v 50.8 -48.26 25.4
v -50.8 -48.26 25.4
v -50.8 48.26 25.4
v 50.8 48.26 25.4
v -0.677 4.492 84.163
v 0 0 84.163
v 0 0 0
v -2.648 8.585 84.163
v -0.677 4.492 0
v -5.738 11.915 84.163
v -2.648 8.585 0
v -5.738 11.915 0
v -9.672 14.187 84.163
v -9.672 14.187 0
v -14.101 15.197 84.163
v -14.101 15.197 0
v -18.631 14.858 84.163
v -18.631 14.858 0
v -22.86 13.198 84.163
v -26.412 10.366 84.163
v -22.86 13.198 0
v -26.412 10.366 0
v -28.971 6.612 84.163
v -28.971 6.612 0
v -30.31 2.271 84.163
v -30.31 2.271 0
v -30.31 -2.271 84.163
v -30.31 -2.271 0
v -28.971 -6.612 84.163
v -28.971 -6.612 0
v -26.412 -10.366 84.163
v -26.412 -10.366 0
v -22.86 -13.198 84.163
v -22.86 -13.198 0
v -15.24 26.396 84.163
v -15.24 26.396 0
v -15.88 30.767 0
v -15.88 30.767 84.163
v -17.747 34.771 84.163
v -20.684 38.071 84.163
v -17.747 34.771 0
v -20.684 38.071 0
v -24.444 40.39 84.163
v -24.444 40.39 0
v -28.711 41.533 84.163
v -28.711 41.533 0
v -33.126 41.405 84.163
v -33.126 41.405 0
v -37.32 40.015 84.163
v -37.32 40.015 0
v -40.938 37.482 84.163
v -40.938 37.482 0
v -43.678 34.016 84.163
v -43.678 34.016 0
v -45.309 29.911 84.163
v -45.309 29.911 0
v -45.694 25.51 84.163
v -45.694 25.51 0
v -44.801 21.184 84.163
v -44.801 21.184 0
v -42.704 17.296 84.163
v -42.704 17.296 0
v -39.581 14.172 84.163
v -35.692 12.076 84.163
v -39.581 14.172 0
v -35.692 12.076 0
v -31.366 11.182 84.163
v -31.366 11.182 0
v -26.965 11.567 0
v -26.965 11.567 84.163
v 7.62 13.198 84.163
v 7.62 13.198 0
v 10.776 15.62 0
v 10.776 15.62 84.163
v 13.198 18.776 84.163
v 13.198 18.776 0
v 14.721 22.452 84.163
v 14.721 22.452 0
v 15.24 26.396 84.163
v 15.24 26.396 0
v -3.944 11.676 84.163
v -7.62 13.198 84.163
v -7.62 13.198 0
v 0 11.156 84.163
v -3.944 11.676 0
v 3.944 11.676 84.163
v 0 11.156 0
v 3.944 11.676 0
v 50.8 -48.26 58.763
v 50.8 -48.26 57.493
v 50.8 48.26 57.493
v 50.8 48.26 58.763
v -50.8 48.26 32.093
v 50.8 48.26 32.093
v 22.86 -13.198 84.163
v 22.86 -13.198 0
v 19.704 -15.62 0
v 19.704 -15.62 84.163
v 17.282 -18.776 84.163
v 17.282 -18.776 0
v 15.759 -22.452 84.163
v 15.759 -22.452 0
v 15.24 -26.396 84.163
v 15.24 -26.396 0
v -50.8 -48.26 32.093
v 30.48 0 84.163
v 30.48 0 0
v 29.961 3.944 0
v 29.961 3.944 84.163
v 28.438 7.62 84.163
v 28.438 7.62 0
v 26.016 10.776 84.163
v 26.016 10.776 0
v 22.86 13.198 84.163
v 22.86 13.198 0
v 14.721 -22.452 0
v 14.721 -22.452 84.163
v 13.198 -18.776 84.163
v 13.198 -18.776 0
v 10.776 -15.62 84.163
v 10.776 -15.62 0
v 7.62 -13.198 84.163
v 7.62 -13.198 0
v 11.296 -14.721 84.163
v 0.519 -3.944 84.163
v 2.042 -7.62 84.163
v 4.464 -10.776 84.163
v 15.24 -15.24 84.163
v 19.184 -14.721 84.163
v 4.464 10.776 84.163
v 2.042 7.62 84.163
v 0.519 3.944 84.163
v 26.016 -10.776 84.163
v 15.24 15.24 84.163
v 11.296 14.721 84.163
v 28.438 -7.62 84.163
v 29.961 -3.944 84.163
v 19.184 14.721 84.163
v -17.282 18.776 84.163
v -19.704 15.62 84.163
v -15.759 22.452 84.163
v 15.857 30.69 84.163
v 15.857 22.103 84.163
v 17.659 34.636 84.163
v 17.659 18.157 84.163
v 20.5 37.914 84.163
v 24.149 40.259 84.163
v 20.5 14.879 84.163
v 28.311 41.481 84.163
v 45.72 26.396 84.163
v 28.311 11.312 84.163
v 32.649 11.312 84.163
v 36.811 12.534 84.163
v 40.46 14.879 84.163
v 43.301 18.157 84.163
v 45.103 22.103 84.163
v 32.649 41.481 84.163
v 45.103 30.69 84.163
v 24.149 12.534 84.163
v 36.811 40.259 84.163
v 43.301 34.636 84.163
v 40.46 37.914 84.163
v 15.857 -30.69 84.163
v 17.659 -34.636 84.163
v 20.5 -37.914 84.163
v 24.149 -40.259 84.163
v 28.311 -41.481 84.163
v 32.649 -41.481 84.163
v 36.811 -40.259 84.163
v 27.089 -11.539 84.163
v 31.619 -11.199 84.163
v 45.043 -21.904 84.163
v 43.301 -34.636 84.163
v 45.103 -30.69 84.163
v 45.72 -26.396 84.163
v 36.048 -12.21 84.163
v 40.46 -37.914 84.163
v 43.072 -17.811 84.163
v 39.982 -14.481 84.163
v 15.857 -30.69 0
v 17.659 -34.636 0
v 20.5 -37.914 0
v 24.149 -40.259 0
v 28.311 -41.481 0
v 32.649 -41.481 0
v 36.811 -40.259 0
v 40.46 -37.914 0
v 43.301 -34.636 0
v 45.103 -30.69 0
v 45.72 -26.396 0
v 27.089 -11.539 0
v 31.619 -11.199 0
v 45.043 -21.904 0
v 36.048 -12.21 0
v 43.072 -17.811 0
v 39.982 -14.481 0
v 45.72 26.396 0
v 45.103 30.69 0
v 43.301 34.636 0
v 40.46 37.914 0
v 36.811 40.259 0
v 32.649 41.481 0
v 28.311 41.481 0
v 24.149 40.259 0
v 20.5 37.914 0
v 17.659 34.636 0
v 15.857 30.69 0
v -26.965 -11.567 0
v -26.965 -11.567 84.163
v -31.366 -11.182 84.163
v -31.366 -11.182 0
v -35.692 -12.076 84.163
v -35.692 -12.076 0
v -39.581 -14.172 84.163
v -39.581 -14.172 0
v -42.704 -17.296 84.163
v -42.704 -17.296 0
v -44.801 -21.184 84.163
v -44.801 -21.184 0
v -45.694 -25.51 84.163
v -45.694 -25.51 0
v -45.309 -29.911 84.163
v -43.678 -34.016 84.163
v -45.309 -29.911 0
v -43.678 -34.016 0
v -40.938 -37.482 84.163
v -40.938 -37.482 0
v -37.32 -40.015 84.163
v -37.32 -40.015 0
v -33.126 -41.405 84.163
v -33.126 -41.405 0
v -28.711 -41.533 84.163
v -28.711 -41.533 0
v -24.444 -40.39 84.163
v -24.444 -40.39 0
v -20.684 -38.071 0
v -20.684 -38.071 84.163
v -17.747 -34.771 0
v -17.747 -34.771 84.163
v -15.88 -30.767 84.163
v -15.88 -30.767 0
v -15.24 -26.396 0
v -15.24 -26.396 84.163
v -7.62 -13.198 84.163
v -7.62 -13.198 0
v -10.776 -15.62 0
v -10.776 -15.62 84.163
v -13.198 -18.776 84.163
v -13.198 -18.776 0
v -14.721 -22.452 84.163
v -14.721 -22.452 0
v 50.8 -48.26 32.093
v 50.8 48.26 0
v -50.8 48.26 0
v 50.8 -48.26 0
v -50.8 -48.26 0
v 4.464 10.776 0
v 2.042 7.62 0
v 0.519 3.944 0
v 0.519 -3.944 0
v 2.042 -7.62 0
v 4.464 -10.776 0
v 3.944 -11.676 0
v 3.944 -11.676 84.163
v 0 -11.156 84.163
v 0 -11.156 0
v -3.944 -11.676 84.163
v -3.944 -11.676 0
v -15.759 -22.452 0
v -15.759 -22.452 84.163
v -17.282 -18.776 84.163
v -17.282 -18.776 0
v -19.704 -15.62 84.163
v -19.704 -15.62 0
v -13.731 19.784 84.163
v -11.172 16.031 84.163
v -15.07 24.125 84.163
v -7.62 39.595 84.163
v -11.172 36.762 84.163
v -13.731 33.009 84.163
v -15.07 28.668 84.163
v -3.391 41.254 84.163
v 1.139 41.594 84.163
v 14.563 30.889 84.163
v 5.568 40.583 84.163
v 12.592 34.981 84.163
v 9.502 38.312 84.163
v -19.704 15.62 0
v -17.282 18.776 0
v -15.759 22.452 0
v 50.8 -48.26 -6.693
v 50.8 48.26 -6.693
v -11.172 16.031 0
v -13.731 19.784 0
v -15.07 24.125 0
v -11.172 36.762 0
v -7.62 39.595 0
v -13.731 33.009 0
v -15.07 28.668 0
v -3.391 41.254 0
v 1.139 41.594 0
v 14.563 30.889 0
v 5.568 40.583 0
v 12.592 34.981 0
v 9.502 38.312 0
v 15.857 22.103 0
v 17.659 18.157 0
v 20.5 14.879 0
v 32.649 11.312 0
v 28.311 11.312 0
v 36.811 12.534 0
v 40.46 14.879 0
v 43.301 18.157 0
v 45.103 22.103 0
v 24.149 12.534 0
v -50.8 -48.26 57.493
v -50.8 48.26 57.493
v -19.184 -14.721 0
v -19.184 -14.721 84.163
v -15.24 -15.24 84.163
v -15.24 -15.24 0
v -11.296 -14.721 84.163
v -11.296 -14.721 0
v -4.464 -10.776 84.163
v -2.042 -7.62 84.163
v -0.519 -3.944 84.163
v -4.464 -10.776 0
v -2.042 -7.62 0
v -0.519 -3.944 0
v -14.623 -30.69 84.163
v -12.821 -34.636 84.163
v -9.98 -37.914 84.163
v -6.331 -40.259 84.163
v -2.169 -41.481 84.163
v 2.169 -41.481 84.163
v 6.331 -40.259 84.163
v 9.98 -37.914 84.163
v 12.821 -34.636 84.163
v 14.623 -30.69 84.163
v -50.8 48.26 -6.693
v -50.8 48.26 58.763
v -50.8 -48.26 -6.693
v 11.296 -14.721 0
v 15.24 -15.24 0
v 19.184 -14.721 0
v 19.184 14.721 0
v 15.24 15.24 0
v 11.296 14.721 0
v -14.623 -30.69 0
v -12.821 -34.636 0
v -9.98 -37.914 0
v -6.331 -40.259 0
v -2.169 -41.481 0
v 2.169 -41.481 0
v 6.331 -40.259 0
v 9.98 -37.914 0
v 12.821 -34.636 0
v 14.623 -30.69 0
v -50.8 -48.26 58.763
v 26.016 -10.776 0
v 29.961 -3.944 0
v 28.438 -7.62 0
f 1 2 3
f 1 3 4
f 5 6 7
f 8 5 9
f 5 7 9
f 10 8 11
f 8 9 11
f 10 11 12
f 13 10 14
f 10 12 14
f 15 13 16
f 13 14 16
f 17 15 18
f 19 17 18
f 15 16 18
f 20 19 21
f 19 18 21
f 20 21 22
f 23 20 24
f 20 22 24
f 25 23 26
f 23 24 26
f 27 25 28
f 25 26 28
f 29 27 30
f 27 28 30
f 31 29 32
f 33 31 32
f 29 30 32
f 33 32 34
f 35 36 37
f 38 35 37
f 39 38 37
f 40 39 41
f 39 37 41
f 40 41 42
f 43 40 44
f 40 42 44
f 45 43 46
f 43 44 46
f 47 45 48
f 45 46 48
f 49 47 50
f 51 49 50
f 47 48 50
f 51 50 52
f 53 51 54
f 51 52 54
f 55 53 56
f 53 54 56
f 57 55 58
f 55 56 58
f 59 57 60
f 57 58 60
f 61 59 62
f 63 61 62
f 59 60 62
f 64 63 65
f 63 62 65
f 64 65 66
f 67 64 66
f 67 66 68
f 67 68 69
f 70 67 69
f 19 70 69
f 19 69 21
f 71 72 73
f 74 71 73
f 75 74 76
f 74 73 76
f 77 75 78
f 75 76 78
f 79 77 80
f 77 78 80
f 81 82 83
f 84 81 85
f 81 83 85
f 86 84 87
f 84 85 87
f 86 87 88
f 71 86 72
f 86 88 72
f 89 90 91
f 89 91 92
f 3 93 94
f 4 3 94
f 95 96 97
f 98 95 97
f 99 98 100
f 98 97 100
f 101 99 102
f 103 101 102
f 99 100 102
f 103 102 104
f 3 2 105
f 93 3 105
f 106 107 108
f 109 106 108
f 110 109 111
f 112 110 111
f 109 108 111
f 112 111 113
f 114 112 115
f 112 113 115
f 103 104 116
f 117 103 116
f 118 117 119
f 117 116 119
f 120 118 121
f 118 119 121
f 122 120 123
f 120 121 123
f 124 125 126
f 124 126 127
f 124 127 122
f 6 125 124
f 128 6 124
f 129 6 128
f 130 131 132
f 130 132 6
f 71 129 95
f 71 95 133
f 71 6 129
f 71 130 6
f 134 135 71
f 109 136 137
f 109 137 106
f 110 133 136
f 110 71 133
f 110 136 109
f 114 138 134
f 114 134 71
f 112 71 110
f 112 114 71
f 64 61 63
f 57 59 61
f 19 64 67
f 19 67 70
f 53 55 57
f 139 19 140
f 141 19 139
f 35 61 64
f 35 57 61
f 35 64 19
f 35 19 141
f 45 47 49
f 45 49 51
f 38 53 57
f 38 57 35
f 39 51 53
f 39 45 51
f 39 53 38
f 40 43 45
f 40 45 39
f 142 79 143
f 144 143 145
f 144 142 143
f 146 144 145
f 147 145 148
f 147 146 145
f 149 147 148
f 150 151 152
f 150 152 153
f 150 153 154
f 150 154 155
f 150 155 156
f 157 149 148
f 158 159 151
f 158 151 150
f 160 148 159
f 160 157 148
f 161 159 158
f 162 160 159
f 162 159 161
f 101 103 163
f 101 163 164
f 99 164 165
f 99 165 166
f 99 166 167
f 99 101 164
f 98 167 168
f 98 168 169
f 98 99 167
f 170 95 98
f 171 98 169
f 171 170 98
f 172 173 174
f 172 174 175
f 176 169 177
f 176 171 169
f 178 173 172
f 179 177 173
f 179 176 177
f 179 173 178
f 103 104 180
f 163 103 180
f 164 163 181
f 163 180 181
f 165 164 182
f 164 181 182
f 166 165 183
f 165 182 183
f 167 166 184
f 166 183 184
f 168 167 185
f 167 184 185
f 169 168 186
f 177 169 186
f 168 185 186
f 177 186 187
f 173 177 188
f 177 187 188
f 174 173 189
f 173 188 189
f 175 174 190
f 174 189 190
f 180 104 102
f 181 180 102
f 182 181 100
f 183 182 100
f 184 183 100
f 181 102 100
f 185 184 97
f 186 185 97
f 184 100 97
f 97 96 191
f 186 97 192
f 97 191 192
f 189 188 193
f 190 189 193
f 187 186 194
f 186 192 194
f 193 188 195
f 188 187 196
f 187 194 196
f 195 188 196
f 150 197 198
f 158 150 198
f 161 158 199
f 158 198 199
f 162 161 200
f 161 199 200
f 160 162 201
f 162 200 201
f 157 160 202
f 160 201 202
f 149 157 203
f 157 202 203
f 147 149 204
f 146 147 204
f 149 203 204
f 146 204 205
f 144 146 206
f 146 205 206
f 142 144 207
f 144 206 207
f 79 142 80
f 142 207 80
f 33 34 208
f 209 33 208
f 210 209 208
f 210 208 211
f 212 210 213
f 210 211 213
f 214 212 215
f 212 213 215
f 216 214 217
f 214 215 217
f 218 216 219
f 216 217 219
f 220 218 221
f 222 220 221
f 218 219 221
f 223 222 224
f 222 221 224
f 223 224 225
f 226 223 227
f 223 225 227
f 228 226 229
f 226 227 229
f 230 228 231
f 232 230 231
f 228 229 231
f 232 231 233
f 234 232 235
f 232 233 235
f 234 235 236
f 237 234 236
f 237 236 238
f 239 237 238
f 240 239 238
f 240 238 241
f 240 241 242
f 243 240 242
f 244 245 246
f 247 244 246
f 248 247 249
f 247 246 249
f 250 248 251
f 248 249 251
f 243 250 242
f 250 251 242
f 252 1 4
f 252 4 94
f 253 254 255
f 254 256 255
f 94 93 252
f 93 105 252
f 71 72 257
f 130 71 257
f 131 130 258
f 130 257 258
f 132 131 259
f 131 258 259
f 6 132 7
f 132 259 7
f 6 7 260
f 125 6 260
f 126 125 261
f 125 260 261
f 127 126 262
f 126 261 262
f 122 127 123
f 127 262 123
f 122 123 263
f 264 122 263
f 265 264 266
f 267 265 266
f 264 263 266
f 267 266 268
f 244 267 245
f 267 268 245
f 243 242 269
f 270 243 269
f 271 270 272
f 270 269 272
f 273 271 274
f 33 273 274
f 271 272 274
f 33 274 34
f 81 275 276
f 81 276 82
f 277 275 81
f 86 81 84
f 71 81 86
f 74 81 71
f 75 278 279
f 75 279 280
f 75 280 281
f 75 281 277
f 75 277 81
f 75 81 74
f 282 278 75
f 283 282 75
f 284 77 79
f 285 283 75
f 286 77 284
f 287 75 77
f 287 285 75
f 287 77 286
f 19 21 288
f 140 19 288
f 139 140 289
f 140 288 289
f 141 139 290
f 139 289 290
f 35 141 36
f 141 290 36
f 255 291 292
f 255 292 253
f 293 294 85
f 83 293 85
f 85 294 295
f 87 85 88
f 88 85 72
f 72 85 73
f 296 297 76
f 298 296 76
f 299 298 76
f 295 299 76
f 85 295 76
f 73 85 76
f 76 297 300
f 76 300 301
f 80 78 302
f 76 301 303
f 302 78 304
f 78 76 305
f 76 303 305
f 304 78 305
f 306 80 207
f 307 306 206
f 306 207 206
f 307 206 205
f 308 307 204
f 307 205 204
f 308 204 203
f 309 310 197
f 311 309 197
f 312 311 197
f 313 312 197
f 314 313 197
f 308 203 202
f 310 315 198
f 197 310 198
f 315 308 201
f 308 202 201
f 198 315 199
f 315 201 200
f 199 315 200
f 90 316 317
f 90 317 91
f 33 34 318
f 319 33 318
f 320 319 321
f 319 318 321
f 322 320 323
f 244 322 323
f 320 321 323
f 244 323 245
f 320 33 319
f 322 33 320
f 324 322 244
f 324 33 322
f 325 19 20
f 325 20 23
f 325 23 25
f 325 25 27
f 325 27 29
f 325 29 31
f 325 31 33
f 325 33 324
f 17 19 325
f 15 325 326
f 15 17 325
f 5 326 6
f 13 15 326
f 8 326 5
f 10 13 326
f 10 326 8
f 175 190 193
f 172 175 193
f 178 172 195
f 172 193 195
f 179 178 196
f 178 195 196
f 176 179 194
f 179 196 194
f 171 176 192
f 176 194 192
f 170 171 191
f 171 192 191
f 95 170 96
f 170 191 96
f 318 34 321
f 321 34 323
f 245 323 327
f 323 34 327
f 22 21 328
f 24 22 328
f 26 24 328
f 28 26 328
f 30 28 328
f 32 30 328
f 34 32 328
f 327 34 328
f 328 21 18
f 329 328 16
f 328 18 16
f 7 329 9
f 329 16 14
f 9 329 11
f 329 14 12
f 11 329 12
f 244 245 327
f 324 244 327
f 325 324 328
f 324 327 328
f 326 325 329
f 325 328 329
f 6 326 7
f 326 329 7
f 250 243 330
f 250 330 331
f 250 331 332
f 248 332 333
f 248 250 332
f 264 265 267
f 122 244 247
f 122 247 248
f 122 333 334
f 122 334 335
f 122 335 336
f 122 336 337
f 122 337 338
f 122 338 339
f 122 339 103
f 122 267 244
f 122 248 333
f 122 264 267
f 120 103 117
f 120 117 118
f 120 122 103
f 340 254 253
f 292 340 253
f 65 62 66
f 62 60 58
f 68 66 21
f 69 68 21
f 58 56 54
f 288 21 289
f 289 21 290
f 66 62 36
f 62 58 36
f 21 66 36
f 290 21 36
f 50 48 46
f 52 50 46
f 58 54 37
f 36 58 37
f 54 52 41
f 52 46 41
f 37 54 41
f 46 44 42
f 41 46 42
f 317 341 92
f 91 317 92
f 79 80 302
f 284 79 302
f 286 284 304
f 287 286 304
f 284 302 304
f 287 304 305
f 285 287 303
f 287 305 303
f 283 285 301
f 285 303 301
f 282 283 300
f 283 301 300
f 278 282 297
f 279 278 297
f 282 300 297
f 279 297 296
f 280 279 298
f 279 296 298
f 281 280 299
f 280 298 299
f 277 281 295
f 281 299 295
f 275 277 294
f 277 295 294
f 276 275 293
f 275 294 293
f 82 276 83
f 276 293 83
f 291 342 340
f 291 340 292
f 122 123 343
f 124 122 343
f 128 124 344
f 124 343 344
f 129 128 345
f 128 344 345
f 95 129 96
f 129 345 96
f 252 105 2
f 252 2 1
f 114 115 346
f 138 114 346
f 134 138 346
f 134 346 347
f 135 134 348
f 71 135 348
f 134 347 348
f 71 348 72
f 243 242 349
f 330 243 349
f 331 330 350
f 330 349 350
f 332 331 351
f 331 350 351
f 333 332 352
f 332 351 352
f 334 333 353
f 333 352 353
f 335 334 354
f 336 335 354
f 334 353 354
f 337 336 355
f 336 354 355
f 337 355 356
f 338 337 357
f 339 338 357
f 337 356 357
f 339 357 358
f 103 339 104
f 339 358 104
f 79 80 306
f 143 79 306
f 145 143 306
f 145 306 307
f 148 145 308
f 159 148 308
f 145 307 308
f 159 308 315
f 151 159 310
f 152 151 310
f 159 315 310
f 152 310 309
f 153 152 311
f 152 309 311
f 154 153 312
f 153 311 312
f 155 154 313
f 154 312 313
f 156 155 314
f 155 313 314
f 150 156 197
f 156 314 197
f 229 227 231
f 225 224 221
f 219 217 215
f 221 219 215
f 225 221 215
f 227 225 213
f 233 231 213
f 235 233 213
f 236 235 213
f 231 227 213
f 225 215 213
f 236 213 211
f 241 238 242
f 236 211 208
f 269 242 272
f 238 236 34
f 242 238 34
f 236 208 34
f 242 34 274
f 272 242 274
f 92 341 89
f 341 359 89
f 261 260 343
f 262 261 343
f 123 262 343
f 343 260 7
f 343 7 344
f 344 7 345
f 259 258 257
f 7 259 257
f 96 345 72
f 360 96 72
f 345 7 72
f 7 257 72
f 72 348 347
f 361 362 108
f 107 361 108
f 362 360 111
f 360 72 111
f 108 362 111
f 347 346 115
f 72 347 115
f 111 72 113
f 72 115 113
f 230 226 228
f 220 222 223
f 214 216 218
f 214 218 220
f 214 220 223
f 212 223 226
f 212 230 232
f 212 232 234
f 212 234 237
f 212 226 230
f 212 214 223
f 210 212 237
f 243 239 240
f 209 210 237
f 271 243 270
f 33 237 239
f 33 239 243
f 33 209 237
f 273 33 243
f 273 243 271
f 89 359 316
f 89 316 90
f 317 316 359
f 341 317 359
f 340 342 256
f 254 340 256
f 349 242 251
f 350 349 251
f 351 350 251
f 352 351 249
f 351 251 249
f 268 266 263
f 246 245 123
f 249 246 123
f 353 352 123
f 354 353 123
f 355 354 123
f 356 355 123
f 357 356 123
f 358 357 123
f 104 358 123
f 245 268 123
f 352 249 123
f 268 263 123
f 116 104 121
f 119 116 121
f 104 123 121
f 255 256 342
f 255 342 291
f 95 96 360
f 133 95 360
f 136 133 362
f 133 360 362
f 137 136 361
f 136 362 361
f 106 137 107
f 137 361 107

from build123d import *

# Parameters (mm, degrees)
F1_DEPTH = 84.1627984
F2_W     = 101.6
F2_H     = 6.6927933697
F3_DEPTH = 48.26
F2_H_2   = 6.6927984
F2_H_3   = 1.27


# Not quite as in the source:
# - a feature names something its author has since deleted; it is built from what else it names


with BuildPart() as f1:
    # F0 (on Top) → F1 (new body)
    with BuildSketch(Plane.XY):
        with BuildLine():
            ThreePointArc((-22.8599997596, -13.1982272925), (-43.6782272231, -34.0164541872), (-15.24, -26.3964543073))
            ThreePointArc((-15.24, -26.3964543073), (-17.2817727769, -18.7764544275), (-22.8599997596, -13.1982272925))
        make_face()
    extrude(amount=F1_DEPTH)


with BuildPart() as f1b:
    # F0 (on Top) → F1, piece 2 (new body)
    with BuildSketch(Plane.XY):
        with BuildLine():
            ThreePointArc((-7.6199998958, -13.1982270935), (-13.1982271236, -18.7764542553), (-15.24, -26.3964543073))
            ThreePointArc((-15.24, -26.3964543073), (0, -41.6364543073), (15.24, -26.3964543073))
            ThreePointArc((15.24, -26.3964543073), (13.1982272501, -18.7764544743), (7.6200003339, -13.1982273465))
            ThreePointArc((7.6200003339, -13.1982273465), (2.529e-07, -11.1564543073), (-7.6199998958, -13.1982270935))
        make_face()
    extrude(amount=F1_DEPTH)


with BuildPart() as f1c:
    # F0 (on Top) → F1, piece 3 (new body)
    with BuildSketch(Plane.XY):
        with BuildLine():
            ThreePointArc((-22.8600001039, 13.1982270937), (-30.48, -1.988e-07), (-22.8599997596, -13.1982272925))
            ThreePointArc((-22.8599997596, -13.1982272925), (-15.2399998011, -15.24), (-7.6199998958, -13.1982270935))
            ThreePointArc((-7.6199998958, -13.1982270935), (-2.0417728163, -7.6199999479), (0, 0))
            ThreePointArc((0, 0), (-2.0417727499, 7.619999833), (-7.6199996661, 13.1982269609))
            ThreePointArc((-7.6199996661, 13.1982269609), (-15.2399998672, 15.24), (-22.8600001039, 13.1982270937))
        make_face()
    extrude(amount=F1_DEPTH)


with BuildPart() as f1d:
    # F0 (on Top) → F1, piece 4 (new body)
    with BuildSketch(Plane.XY):
        with BuildLine():
            ThreePointArc((22.8599997751, -13.1982272835), (17.2817727814, -18.7764544198), (15.24, -26.3964543073))
            ThreePointArc((15.24, -26.3964543073), (30.48, -41.6364543073), (45.72, -26.3964543073))
            ThreePointArc((45.72, -26.3964543073), (38.0999998875, -13.1982270887), (22.8599997751, -13.1982272835))
        make_face()
    extrude(amount=F1_DEPTH)


with BuildPart() as f1e:
    # F0 (on Top) → F1, piece 5 (new body)
    with BuildSketch(Plane.XY):
        with BuildLine():
            ThreePointArc((-15.24, 26.3964543073), (-43.6782271237, 34.0164543593), (-22.8600001039, 13.1982270937))
            ThreePointArc((-22.8600001039, 13.1982270937), (-17.2817728763, 18.7764542554), (-15.24, 26.3964543073))
        make_face()
    extrude(amount=F1_DEPTH)


with BuildPart() as f1f:
    # F0 (on Top) → F1, piece 6 (new body)
    with BuildSketch(Plane.XY):
        with BuildLine():
            ThreePointArc((0, 0), (2.0417729427, -7.620000167), (7.6200003339, -13.1982273465))
            ThreePointArc((7.6200003339, -13.1982273465), (15.2400000629, -15.24), (22.8599997751, -13.1982272835))
            ThreePointArc((22.8599997751, -13.1982272835), (28.4382270887, -7.6200001125), (30.48, 0))
            ThreePointArc((30.48, 0), (28.4382272477, 7.6199998371), (22.8600003259, 13.1982269655))
            ThreePointArc((22.8600003259, 13.1982269655), (15.2400002483, 15.24), (7.6200001042, 13.1982272138))
            ThreePointArc((7.6200001042, 13.1982272138), (2.0417728764, 7.6200000521), (0, 0))
        make_face()
    extrude(amount=F1_DEPTH)


with BuildPart() as f1g:
    # F0 (on Top) → F1, piece 7 (new body)
    with BuildSketch(Plane.XY):
        with BuildLine():
            ThreePointArc((-15.24, 26.3964543073), (-13.1982270573, 18.7764541404), (-7.6199996661, 13.1982269609))
            ThreePointArc((-7.6199996661, 13.1982269609), (2.529e-07, 11.1564543073), (7.6200001042, 13.1982272138))
            ThreePointArc((7.6200001042, 13.1982272138), (13.1982271837, 18.7764543594), (15.24, 26.3964543073))
            ThreePointArc((15.24, 26.3964543073), (0, 41.6364543073), (-15.24, 26.3964543073))
        make_face()
    extrude(amount=F1_DEPTH)


with BuildPart() as f1h:
    # F0 (on Top) → F1, piece 8 (new body)
    with BuildSketch(Plane.XY):
        with BuildLine():
            ThreePointArc((45.72, 26.3964543073), (30.48, 41.6364543073), (15.24, 26.3964543073))
            ThreePointArc((15.24, 26.3964543073), (17.2817729404, 18.7764541444), (22.8600003259, 13.1982269655))
            ThreePointArc((22.8600003259, 13.1982269655), (38.1000001629, 13.1982272477), (45.72, 26.3964543073))
        make_face()
    extrude(amount=F1_DEPTH)


with BuildPart() as f3:
    # F2 (on Front) → F3 (new body, symmetric)
    with BuildSketch(Plane.XZ):
        with Locations((0, -3.3463966849)):
            Rectangle(F2_W, F2_H)
    extrude(amount=F3_DEPTH, both=True)


with BuildPart() as f3b:
    # F2 (on Front) → F3, piece 2 (new body, symmetric)
    with BuildSketch(Plane.XZ):
        with Locations((0, 28.7463992)):
            Rectangle(F2_W, F2_H_2)
    extrude(amount=F3_DEPTH, both=True)


with BuildPart() as f3c:
    # F2 (on Front) → F3, piece 3 (new body, symmetric)
    with BuildSketch(Plane.XZ):
        with Locations((0, 58.1277984)):
            Rectangle(F2_W, F2_H_3)
    extrude(amount=F3_DEPTH, both=True)


solid = Compound([f1.part, f1b.part, f1c.part, f1d.part, f1e.part, f1f.part, f1g.part, f1h.part, f3.part, f3b.part, f3c.part])
